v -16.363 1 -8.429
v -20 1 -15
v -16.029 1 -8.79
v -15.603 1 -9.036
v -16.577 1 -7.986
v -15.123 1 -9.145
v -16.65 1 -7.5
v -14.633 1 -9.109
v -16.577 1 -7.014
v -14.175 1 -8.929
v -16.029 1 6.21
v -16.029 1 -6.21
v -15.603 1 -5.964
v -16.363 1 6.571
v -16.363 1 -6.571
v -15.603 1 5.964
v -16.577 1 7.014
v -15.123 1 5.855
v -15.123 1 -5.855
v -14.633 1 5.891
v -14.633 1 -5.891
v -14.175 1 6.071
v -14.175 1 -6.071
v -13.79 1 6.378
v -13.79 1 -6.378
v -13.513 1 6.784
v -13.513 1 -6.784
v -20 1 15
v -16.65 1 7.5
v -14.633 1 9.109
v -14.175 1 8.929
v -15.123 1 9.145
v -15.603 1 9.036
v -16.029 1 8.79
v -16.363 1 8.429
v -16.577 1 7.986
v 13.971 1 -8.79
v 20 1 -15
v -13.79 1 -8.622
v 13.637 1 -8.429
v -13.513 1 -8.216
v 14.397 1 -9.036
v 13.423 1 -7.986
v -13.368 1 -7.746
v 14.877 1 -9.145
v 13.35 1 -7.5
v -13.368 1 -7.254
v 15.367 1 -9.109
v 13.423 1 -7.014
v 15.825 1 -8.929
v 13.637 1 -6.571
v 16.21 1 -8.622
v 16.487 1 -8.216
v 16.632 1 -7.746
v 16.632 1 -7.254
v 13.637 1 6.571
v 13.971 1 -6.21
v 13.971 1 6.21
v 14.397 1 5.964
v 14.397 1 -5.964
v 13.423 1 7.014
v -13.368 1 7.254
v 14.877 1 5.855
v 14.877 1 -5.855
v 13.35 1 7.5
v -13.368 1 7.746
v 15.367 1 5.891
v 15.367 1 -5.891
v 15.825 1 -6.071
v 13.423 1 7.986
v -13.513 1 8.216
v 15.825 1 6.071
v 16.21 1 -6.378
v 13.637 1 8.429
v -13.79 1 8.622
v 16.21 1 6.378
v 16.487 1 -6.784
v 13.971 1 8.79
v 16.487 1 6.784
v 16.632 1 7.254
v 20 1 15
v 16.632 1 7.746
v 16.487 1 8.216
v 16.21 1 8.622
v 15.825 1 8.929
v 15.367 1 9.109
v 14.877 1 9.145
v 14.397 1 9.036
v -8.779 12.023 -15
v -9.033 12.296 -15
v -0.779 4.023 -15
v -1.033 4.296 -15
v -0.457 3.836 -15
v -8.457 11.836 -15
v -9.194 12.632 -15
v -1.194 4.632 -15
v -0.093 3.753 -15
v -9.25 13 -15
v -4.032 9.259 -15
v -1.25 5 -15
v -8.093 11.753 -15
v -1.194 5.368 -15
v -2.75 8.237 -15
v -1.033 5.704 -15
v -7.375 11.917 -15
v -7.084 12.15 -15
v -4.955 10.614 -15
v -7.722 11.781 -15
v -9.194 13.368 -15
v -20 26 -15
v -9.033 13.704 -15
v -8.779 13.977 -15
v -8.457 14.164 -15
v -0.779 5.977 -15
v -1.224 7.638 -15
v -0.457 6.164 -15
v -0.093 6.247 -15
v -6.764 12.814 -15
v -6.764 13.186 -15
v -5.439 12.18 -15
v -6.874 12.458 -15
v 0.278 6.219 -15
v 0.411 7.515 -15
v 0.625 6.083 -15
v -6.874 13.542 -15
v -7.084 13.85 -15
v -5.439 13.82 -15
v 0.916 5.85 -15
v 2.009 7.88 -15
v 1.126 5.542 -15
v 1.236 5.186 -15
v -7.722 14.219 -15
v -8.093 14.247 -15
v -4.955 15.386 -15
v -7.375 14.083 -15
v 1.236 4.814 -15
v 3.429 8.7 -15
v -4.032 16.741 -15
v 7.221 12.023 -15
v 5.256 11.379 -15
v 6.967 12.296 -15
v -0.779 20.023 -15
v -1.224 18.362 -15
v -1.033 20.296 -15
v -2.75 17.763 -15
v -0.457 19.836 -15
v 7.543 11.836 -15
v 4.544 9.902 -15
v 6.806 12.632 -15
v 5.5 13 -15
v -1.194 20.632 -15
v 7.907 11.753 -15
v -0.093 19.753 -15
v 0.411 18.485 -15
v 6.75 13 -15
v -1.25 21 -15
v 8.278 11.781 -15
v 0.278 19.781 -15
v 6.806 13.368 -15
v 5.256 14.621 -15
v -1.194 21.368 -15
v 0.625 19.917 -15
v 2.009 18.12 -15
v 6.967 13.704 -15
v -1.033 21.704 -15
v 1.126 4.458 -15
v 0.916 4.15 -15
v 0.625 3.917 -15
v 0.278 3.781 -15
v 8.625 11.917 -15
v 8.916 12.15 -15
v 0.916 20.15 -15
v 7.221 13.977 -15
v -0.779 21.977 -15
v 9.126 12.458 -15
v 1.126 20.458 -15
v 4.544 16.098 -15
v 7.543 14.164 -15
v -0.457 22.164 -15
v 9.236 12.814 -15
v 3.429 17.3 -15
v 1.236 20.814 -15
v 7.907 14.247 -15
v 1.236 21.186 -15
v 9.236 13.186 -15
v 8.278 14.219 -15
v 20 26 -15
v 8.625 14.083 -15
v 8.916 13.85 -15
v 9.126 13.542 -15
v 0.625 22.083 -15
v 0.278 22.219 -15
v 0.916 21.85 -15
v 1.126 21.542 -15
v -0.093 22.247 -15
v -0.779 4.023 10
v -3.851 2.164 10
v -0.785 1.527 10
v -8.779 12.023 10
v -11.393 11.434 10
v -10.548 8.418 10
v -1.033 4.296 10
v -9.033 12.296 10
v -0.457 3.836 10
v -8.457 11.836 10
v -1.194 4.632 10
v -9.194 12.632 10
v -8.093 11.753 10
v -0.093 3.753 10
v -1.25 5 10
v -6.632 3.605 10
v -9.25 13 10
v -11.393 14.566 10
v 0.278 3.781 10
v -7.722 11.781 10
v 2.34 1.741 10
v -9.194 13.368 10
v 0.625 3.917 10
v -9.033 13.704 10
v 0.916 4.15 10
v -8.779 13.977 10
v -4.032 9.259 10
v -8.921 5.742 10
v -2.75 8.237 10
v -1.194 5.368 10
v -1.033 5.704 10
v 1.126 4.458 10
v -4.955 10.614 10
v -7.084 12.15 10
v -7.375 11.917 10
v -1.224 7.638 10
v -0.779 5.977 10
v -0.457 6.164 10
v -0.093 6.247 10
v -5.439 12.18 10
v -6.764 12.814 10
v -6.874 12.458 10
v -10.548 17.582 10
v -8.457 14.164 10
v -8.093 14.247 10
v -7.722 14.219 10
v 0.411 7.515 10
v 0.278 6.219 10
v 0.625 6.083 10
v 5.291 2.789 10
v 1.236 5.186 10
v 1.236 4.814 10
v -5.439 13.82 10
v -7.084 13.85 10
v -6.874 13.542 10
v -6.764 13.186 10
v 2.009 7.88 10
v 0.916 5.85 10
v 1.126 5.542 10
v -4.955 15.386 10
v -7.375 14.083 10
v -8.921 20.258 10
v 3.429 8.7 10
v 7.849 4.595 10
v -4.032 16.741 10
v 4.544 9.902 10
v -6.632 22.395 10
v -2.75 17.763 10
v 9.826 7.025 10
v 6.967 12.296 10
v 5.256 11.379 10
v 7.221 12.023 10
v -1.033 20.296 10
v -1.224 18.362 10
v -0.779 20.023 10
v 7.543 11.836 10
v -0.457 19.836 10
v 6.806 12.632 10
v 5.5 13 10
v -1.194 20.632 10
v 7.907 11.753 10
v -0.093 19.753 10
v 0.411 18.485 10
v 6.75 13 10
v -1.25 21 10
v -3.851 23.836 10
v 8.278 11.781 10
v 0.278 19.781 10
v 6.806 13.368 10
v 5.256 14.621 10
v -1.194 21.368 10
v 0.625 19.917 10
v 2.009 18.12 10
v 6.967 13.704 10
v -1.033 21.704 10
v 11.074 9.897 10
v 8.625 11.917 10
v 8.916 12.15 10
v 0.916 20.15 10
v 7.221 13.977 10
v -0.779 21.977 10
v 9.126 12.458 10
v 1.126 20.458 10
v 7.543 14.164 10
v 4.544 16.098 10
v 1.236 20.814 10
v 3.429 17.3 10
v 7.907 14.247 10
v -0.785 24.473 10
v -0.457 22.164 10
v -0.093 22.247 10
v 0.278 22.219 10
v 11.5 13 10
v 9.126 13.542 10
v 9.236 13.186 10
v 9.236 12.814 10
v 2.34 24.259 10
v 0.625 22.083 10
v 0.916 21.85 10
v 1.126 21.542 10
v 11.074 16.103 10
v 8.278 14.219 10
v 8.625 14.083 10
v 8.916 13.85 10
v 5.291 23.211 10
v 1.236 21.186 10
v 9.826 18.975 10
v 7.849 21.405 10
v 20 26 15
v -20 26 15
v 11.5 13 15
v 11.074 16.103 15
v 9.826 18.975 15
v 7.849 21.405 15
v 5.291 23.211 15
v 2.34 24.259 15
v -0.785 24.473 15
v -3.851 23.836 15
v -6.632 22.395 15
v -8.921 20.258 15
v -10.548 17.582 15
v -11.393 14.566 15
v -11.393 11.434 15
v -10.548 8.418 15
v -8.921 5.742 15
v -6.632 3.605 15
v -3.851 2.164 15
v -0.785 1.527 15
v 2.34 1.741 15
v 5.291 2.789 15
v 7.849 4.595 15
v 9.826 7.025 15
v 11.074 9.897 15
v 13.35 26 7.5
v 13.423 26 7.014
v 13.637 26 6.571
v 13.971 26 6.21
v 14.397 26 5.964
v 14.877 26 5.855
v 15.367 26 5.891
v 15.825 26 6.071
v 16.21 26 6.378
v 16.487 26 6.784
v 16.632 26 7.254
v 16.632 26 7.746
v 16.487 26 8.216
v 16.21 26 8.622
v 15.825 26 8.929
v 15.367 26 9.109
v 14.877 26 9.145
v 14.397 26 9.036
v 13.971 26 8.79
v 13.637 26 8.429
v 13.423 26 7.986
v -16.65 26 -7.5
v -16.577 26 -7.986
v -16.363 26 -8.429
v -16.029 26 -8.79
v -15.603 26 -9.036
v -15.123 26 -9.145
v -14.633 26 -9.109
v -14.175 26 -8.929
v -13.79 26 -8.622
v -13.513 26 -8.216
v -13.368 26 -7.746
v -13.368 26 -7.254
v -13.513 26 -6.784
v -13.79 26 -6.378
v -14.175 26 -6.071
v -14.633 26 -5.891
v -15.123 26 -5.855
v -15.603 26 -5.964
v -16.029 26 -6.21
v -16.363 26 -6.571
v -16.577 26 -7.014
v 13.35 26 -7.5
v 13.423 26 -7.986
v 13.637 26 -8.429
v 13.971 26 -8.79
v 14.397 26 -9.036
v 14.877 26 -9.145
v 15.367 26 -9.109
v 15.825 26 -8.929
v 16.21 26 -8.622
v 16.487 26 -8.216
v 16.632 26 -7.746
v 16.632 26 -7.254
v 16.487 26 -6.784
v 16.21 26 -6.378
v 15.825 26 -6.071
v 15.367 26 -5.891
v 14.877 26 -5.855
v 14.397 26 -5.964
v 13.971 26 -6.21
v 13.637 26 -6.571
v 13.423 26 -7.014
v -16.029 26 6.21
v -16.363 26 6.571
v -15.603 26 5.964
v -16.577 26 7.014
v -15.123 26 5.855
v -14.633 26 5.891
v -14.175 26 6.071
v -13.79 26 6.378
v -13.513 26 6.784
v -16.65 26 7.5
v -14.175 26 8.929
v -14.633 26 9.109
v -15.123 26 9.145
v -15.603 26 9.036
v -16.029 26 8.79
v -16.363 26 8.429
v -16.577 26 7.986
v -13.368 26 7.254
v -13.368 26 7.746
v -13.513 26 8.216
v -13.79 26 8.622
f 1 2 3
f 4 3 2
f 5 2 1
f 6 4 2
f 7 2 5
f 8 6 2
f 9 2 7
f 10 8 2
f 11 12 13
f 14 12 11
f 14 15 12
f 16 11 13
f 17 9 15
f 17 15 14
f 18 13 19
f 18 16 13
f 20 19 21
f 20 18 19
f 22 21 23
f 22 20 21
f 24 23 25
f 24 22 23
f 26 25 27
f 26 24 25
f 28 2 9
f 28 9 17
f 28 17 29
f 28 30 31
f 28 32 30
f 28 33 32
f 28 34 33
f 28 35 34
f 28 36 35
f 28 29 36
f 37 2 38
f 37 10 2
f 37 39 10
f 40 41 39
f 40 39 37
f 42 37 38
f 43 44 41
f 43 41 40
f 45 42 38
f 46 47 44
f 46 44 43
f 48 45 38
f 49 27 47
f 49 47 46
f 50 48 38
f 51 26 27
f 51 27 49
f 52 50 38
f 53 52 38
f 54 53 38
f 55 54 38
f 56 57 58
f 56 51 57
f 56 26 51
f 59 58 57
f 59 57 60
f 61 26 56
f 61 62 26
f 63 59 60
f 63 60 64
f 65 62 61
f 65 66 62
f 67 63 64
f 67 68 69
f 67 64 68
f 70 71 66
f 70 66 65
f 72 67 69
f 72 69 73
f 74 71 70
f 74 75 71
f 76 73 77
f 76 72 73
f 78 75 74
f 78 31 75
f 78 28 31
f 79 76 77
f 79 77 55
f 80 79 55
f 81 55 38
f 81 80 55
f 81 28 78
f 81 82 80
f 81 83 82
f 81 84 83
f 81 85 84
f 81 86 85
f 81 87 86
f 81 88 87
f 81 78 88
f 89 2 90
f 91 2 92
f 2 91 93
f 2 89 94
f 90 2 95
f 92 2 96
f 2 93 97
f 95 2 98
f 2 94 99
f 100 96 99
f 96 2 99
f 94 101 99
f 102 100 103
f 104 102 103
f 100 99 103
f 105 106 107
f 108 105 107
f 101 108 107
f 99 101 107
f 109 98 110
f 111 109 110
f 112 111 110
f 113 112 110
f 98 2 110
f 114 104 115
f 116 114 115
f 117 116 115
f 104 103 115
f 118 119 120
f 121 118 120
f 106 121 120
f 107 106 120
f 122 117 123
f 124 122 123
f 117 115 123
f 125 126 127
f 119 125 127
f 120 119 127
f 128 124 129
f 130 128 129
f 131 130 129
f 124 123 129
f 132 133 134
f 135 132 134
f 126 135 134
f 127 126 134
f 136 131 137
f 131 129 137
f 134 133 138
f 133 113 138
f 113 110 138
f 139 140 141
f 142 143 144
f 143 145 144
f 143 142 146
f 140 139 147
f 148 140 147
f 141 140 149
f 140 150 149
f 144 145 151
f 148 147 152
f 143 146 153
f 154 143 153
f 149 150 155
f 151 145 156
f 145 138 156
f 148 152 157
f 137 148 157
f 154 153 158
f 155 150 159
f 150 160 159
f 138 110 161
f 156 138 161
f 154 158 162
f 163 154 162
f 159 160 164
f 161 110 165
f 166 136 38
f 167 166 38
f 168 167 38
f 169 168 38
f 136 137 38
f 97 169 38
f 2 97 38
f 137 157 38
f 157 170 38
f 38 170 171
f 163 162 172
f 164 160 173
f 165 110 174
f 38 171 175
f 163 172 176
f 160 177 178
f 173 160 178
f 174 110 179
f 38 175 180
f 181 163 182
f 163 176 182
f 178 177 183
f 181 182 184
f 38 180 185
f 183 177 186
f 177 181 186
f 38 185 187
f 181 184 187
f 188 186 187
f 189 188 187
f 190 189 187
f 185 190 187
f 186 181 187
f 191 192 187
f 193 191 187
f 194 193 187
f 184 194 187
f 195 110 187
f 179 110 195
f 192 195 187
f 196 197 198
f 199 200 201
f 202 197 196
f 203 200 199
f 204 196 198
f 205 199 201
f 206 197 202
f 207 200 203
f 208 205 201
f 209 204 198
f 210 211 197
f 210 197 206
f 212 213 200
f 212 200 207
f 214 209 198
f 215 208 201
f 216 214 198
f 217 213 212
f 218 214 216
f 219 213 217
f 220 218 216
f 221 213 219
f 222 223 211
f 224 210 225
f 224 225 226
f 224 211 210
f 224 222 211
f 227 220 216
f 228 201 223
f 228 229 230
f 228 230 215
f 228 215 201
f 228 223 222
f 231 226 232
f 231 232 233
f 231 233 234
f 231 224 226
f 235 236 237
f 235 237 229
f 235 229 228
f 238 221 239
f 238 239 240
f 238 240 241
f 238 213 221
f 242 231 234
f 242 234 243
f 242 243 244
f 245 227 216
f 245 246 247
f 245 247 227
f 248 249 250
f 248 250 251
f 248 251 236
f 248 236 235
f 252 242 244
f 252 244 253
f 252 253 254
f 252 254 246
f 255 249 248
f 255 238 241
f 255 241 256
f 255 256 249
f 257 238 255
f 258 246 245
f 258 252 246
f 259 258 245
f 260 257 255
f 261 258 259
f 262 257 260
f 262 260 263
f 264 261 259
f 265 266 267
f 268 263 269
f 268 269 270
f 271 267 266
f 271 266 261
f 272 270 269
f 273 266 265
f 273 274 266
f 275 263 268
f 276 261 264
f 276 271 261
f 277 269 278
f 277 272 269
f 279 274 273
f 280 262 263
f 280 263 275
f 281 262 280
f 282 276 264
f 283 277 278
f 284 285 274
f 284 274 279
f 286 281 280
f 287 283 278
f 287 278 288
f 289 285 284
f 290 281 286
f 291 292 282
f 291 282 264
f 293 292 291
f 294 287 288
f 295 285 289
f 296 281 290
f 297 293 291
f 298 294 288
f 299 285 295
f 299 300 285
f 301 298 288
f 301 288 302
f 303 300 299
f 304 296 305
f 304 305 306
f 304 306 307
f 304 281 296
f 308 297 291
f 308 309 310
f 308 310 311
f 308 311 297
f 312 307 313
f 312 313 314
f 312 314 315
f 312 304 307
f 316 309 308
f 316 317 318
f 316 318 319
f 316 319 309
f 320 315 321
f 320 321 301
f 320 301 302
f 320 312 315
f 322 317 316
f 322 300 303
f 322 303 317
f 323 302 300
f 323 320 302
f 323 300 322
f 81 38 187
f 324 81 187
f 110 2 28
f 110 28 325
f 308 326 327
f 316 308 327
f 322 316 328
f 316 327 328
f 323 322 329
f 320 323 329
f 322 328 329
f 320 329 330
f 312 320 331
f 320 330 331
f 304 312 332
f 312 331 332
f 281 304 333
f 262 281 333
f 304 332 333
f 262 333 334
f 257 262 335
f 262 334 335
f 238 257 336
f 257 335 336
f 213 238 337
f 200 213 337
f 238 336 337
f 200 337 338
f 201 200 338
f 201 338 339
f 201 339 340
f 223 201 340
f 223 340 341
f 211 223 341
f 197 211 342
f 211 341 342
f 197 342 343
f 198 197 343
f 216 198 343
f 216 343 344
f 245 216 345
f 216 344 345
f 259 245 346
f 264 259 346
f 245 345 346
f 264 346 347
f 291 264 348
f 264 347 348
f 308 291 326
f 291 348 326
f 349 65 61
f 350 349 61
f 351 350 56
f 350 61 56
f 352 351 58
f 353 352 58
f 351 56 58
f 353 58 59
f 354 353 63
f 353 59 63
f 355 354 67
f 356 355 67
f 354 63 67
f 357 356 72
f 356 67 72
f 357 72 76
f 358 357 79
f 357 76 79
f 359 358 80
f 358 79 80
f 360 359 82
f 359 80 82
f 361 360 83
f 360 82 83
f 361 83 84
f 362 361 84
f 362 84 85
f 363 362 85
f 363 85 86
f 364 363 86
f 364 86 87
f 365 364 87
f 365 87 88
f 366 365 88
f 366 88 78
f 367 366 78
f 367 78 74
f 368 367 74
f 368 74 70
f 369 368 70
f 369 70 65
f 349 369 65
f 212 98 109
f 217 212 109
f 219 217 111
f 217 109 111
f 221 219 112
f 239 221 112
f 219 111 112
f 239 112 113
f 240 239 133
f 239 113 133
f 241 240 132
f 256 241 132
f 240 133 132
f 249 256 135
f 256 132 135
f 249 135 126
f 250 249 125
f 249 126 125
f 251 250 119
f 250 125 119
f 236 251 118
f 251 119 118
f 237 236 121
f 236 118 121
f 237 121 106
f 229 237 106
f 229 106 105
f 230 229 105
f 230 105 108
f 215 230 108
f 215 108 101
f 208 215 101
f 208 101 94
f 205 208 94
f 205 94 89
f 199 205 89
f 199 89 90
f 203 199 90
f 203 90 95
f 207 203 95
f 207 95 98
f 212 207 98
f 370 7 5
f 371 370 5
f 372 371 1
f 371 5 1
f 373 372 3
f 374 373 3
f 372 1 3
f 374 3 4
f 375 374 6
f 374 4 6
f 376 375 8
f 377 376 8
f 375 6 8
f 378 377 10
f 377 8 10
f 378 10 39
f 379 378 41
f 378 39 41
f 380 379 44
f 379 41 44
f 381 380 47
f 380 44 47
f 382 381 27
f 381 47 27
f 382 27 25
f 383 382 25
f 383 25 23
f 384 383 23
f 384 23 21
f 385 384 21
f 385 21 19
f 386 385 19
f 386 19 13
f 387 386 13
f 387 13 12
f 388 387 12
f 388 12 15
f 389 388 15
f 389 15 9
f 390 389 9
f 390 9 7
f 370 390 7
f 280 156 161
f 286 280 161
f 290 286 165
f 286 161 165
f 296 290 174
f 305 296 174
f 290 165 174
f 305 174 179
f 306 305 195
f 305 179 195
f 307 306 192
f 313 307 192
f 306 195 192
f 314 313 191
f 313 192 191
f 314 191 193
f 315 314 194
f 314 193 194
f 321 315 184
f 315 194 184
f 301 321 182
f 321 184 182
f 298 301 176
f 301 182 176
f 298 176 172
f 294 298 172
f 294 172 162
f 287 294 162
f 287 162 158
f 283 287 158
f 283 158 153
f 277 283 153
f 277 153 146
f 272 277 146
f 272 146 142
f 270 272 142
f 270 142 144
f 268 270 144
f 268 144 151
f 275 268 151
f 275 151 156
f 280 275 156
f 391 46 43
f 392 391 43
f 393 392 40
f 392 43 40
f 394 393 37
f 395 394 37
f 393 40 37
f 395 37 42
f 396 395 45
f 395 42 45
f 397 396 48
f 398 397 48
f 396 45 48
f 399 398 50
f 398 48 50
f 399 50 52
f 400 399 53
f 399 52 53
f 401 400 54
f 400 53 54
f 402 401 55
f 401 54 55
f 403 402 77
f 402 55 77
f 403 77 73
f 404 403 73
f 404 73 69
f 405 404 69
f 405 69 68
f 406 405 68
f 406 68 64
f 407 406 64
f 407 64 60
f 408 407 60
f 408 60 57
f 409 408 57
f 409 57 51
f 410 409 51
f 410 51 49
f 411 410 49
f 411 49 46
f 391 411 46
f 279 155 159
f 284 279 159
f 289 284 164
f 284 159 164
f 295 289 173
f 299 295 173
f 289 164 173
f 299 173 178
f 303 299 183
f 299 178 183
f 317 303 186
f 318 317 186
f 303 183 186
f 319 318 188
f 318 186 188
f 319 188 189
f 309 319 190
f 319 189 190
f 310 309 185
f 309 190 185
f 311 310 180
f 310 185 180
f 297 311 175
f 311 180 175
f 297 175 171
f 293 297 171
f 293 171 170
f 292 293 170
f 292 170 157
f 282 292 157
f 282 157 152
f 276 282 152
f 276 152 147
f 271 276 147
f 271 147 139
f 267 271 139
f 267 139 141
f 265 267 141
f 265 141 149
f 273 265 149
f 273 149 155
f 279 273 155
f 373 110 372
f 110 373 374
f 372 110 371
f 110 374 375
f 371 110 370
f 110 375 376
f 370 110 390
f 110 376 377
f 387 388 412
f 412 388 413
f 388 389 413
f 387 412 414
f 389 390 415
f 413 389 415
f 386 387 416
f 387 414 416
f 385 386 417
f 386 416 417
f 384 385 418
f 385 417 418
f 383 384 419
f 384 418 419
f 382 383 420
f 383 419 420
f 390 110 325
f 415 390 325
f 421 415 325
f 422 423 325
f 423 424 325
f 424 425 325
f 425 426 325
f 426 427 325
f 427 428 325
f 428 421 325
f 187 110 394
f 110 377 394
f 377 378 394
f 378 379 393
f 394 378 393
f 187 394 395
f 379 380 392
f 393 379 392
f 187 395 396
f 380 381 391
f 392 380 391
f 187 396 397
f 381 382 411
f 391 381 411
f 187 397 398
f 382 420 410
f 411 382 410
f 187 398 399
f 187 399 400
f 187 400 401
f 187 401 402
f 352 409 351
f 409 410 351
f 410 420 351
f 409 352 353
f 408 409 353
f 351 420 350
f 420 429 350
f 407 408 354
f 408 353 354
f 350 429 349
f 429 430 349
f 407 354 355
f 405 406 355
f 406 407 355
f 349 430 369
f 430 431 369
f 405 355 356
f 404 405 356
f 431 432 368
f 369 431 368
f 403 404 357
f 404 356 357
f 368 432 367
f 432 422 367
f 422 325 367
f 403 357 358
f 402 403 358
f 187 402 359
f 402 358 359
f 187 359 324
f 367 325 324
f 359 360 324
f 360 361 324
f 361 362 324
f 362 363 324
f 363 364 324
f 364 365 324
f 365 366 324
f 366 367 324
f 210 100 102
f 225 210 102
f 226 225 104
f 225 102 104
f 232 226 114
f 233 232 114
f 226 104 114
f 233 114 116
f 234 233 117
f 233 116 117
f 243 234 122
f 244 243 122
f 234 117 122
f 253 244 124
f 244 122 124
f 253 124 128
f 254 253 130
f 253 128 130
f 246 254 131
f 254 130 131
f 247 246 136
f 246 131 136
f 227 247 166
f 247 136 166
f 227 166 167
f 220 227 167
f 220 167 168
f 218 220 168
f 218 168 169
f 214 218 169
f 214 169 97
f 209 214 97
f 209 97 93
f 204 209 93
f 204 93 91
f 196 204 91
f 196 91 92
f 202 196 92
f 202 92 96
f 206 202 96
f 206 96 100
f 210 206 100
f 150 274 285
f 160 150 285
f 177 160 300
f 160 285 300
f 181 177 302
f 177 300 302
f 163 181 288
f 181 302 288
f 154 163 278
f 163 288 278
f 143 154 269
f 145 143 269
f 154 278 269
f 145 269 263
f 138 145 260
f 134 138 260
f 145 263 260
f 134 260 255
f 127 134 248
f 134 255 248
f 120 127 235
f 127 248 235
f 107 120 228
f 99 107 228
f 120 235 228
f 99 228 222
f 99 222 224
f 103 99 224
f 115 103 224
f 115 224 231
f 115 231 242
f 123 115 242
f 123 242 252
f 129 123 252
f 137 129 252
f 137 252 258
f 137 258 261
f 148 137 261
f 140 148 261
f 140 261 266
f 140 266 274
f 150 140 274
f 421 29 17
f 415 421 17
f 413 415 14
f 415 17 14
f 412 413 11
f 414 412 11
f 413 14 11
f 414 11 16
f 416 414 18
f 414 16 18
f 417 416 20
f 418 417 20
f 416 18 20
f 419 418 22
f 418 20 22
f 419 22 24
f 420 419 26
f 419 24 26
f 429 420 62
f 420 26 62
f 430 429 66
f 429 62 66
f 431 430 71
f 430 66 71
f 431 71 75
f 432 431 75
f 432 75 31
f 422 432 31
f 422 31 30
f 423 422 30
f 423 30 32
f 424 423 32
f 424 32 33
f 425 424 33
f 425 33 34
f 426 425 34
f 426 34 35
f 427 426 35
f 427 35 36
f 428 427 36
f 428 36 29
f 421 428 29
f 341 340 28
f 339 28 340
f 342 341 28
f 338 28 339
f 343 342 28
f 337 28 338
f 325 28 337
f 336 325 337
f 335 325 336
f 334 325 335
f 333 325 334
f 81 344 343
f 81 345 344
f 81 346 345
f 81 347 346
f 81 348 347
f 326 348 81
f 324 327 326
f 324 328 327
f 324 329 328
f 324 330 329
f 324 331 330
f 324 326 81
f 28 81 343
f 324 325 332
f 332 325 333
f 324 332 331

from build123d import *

# Parameters (mm, degrees)
SKETCH1_W           = 40
SKETCH1_H           = 26
BOSS_EXTRUDE1_DEPTH = 15
SKETCH2_R           = 11.5
CUT_EXTRUDE1_DEPTH  = 5
SKETCH3_R           = 5.5
CUT_EXTRUDE2_DEPTH  = 42.243181255
M4_TAPPED_HOLE1_D   = 3.3
M3_TAPPED_HOLE2_D   = 2.5
SKETCH9_W           = 40
SKETCH9_H           = 1
CUT_EXTRUDE4_DEPTH  = 45.452221542


with BuildPart() as part:
    # Sketch1 → Boss-Extrude1 (new, symmetric)
    with BuildSketch(Plane.XY):
        with Locations((0, 13)):
            Rectangle(SKETCH1_W, SKETCH1_H)
    extrude(amount=BOSS_EXTRUDE1_DEPTH, both=True)

    # Sketch2 → Cut-Extrude1 (cut)
    with BuildSketch(Plane.XY.offset(15)):
        with Locations((0, 13)):
            Circle(SKETCH2_R)
    extrude(amount=-CUT_EXTRUDE1_DEPTH, mode=Mode.SUBTRACT)

    # Sketch3 → Cut-Extrude2 (cut, through all)
    with BuildSketch(Plane.XY.offset(10)):
        with Locations((0, 13)):
            Circle(SKETCH3_R)
    extrude(amount=-CUT_EXTRUDE2_DEPTH, mode=Mode.SUBTRACT)

    # M4 Tapped Hole1 (through all)
    with Locations(Plane(origin=(0, 26, 0), x_dir=(1, 0, 0), z_dir=(0, 1, 0))):
        with Locations((-15, 7.5), (15, 7.5), (15, -7.5), (-15, -7.5)):
            Hole(M4_TAPPED_HOLE1_D / 2)

    # M3 Tapped Hole2 (through all)
    with Locations(Plane.XY.offset(10)):
        with Locations((0, 13), (0, 21), (0, 5), (-8, 13), (8, 13)):
            Hole(M3_TAPPED_HOLE2_D / 2)

    # Sketch9 → Cut-Extrude4 (cut, through all)
    with BuildSketch(Plane.XY.offset(15)):
        with Locations((0, 0.5)):
            Rectangle(SKETCH9_W, SKETCH9_H)
    extrude(amount=-CUT_EXTRUDE4_DEPTH, mode=Mode.SUBTRACT)


solid = part.part
